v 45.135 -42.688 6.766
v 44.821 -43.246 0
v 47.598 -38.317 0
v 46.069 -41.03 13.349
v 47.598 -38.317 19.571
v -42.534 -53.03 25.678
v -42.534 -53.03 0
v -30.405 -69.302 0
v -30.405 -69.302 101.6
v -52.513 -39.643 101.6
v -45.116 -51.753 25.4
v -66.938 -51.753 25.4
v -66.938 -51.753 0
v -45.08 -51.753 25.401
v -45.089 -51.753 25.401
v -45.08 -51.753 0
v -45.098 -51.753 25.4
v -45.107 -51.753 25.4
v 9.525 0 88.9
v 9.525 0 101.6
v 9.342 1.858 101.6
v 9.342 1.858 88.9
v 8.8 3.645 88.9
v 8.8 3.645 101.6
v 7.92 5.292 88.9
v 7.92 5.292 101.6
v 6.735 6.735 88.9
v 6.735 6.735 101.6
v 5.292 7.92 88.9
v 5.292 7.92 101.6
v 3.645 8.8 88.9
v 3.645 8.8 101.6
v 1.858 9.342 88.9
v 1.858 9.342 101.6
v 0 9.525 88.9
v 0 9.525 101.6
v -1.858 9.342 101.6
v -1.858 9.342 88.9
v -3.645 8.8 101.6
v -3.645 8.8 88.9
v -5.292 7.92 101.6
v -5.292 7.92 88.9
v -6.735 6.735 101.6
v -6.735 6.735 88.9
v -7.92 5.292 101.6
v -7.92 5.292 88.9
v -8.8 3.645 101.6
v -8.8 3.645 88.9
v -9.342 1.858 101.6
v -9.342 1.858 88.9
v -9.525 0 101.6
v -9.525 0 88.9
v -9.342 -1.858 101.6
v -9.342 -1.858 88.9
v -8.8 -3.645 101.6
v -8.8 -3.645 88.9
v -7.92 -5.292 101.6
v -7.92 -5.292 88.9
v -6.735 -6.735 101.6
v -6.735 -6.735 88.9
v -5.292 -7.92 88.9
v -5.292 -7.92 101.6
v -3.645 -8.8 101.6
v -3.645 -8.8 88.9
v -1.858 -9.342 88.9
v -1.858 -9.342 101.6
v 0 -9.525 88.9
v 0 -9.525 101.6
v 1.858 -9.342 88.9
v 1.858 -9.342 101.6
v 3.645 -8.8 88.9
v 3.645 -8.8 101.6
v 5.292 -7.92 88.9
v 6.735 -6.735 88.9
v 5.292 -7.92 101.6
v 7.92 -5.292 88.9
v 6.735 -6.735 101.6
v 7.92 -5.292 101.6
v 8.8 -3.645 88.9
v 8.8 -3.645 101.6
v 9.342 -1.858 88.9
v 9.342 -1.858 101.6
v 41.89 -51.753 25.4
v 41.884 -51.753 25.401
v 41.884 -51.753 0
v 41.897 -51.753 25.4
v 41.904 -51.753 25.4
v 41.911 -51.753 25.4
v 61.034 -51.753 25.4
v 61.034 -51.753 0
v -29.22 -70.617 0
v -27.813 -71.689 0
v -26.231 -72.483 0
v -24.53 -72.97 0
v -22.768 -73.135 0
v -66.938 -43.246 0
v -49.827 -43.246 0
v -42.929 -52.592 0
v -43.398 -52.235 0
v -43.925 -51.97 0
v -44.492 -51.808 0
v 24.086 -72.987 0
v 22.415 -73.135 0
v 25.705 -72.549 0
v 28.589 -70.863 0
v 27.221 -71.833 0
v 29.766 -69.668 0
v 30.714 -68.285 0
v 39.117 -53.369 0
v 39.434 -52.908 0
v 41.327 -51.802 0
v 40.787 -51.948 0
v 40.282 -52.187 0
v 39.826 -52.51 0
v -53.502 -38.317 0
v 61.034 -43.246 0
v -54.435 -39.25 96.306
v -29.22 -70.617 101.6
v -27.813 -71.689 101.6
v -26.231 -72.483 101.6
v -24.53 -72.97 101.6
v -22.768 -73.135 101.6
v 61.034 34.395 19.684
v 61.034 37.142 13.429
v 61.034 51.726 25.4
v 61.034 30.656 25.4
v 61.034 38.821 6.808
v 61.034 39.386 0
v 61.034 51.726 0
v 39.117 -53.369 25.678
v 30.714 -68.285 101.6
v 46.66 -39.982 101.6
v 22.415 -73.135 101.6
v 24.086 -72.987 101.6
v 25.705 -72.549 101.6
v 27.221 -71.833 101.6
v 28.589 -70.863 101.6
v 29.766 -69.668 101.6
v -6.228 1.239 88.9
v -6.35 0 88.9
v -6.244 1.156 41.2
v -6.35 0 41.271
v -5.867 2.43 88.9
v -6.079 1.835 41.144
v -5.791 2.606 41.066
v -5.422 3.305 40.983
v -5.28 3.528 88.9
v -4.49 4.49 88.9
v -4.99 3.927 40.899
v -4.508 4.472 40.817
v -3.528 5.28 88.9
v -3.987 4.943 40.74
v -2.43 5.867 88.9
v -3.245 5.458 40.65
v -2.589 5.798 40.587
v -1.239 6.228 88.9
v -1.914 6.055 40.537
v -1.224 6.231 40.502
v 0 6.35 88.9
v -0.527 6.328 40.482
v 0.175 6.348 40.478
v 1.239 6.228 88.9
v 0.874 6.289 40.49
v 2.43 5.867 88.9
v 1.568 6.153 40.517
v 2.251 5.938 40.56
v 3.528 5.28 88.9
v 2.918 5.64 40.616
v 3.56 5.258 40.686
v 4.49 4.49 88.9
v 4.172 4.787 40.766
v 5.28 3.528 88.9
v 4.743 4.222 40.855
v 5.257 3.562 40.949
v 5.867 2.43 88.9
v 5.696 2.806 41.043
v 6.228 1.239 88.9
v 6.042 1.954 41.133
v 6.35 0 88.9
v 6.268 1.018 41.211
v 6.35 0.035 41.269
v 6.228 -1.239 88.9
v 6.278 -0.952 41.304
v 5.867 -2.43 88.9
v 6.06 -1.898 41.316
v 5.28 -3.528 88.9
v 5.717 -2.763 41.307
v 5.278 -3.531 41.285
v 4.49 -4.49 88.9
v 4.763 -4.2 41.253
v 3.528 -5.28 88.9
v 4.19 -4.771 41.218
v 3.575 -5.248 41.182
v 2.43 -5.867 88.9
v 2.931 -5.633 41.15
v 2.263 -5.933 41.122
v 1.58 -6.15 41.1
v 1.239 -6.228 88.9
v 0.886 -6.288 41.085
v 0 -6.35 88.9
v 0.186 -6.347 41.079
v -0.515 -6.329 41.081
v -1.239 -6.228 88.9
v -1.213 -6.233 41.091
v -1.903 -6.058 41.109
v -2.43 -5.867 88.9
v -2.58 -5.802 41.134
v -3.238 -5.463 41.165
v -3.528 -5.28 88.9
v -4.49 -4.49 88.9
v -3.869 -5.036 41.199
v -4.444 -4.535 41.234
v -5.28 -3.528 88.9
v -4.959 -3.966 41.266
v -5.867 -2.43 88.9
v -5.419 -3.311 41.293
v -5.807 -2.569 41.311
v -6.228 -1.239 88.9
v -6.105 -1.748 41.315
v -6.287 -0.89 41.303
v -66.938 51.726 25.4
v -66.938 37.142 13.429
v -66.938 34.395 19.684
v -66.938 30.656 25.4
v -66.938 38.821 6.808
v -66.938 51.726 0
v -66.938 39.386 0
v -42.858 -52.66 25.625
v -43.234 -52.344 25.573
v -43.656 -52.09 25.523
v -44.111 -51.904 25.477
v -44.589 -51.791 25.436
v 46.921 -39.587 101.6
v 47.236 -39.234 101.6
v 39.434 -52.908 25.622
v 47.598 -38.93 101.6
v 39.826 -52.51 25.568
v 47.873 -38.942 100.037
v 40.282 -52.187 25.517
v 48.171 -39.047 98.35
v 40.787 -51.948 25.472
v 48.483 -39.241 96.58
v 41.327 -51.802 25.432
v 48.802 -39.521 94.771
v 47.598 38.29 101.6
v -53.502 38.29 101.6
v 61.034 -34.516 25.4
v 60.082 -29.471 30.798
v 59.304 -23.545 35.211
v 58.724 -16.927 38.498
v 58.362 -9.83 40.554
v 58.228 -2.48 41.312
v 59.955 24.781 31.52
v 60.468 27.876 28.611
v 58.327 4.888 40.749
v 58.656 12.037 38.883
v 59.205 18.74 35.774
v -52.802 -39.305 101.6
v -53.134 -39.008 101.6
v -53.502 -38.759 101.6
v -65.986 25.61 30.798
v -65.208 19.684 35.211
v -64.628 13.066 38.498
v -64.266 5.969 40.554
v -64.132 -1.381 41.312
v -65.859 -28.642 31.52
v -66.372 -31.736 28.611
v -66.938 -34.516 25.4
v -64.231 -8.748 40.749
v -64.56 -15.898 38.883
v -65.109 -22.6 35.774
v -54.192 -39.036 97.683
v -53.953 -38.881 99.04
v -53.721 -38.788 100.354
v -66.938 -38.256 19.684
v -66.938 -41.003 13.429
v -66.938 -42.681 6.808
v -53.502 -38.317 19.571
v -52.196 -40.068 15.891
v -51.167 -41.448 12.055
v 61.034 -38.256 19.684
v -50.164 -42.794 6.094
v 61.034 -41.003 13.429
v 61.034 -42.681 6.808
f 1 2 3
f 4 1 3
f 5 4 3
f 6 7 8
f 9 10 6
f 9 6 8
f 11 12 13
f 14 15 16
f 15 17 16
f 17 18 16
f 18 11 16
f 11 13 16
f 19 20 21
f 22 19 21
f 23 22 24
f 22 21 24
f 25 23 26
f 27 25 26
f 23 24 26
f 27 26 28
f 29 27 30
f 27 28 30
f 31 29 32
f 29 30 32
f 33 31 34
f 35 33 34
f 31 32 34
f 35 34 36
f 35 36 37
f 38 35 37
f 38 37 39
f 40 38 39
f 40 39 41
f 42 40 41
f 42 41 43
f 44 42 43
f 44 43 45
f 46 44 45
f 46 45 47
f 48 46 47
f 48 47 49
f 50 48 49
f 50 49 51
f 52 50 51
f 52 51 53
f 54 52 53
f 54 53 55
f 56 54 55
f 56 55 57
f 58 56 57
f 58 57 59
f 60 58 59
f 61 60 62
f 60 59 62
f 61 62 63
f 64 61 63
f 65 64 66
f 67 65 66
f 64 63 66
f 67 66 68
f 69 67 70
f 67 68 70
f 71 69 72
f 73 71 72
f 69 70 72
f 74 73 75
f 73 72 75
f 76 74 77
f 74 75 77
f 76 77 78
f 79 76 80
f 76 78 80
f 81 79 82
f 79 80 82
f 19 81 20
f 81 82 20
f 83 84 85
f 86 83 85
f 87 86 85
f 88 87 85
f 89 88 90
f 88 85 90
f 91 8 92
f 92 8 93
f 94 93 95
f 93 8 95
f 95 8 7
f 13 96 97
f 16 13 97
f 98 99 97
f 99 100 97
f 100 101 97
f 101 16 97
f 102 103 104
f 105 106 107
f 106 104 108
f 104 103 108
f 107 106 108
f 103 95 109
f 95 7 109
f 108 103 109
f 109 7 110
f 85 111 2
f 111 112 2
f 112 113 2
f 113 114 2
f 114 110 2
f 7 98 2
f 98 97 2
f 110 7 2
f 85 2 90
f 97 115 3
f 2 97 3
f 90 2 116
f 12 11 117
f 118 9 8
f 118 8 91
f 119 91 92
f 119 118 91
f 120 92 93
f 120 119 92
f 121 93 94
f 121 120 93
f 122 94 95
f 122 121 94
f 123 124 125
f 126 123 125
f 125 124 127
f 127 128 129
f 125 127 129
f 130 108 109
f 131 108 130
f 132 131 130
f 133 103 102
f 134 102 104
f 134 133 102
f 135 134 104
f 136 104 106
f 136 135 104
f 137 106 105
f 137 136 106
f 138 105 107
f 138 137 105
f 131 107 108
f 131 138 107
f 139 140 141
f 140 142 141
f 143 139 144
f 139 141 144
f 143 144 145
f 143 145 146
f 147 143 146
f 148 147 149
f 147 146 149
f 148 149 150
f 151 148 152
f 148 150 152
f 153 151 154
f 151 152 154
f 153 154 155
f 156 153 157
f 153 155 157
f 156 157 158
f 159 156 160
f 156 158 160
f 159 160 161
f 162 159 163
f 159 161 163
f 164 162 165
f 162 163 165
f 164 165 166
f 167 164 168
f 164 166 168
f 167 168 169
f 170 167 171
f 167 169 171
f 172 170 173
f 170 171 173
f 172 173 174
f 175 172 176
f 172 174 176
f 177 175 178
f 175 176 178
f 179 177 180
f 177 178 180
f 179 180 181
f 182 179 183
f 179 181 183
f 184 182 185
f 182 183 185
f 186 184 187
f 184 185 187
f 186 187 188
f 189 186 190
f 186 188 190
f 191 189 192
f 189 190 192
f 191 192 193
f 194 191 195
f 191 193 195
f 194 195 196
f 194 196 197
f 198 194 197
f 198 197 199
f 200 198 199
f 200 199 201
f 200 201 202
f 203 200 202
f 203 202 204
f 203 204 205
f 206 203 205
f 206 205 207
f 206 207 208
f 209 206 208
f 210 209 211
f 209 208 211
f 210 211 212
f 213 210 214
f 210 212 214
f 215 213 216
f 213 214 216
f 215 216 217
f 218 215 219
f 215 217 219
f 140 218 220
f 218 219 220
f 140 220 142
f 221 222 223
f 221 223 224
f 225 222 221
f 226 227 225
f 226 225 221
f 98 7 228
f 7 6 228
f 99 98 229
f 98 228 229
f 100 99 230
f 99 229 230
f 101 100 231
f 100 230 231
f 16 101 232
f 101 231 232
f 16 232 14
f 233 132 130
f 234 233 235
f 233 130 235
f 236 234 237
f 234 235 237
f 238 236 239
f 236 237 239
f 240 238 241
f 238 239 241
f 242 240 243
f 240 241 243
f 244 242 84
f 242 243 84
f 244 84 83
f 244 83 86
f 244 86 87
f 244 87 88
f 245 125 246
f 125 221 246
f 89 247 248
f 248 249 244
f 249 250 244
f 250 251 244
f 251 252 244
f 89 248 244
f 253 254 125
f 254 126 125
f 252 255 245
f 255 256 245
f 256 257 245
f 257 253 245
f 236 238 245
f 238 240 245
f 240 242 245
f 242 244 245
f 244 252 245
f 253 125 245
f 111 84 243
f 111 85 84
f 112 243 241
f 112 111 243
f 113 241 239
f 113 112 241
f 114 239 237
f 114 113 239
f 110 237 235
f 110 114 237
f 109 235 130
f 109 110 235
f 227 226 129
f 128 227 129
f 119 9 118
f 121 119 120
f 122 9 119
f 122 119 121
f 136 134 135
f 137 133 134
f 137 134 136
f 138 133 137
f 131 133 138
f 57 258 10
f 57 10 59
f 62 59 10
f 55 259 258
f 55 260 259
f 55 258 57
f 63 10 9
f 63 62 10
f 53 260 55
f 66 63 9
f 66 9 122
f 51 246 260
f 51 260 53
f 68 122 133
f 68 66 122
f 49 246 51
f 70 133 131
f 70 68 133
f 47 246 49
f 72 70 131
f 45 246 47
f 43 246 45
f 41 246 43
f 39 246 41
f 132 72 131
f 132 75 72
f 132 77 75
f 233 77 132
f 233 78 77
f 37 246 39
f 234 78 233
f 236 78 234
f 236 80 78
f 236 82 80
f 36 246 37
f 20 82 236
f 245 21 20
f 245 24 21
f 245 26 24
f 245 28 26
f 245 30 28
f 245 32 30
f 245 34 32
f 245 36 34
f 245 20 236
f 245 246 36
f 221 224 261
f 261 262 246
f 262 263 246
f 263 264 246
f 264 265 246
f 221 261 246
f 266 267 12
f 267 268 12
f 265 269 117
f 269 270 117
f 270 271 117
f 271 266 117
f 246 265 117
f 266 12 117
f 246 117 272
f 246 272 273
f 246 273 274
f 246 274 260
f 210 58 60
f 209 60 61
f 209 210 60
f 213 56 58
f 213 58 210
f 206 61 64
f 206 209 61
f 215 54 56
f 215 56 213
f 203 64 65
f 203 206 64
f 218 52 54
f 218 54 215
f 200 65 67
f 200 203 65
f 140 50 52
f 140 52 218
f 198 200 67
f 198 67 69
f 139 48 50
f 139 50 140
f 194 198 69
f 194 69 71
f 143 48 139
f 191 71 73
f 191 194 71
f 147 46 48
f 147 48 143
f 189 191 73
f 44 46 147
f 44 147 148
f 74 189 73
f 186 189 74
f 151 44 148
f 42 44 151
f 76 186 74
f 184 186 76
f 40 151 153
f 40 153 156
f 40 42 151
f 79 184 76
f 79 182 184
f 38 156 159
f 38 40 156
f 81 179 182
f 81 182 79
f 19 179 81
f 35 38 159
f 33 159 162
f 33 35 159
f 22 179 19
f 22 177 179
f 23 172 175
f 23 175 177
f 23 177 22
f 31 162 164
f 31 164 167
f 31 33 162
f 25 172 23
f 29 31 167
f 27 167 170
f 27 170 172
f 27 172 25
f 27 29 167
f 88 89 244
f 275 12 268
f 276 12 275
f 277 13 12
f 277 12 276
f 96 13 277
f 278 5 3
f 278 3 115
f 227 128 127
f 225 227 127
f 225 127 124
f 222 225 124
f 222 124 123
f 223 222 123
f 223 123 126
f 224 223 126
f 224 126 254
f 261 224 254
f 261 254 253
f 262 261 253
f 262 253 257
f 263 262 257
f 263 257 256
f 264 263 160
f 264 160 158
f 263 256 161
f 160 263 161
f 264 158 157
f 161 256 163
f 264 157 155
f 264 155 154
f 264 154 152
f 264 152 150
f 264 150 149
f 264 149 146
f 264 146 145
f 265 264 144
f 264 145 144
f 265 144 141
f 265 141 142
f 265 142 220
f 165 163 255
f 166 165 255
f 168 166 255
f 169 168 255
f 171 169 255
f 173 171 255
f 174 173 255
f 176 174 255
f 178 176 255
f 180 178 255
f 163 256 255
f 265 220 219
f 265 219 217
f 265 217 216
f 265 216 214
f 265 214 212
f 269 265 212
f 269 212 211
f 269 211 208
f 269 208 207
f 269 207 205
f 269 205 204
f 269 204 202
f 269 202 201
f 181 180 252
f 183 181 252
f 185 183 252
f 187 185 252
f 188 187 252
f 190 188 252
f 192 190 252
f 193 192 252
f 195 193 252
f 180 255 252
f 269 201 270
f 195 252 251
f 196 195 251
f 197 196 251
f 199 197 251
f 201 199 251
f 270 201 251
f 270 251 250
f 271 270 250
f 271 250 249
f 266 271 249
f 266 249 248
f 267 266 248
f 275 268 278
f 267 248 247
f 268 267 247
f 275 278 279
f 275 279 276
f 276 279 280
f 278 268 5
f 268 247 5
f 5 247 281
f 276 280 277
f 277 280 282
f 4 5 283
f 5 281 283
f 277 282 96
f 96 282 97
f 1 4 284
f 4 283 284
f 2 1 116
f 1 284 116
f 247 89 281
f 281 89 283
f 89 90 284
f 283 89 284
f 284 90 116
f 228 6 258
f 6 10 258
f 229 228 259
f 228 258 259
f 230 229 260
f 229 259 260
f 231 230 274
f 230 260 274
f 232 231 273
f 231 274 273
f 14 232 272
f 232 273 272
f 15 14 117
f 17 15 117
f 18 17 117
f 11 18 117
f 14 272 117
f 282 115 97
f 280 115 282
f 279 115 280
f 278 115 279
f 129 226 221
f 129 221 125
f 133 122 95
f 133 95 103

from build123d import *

# Parameters (mm, degrees)
F0_W           = 127.9716864228
F0_H           = 103.479269892
F1_DEPTH       = 25.4
F1_FACE_W      = 127.9716864228
F1_FACE_H      = 103.479269892
F1_FACE1_W     = 127.9716864228
F1_FACE1_H     = 103.479269892
F2_DEPTH       = 76.2
F2_TAPER       = 10
F3_R           = 41.3158420999
F4_DEPTH       = 76.2
F6_D           = 12.7
F6_CBORE_D     = 19.05
F6_CBORE_DEPTH = 12.7
F8_DEPTH       = 101.6
F9_R           = 3.175
F10_R          = 3.175


with BuildPart() as f1:
    # F0 (on Top) → F1 (new body)
    with BuildSketch(Plane.XY):
        with Locations((-2.9518865049, -0.0131409615)):
            Rectangle(F0_W, F0_H)
    extrude(amount=F1_DEPTH)

    # F1_face (on face) + F1_face1 (on face) → F2 (join)
    with BuildSketch(Plane(origin=(-2.9518865049, -0.0131409615, 25.4), x_dir=(1, 0, 0), z_dir=(0, 0, 1))):
        Rectangle(F1_FACE_W, F1_FACE_H)
    with BuildSketch(Plane(origin=(-2.9518865049, -0.0131409615, 0), x_dir=(1, 0, 0), z_dir=(0, 0, -1))):
        Rectangle(F1_FACE1_W, F1_FACE1_H)
    extrude(amount=F2_DEPTH, taper=F2_TAPER, dir=(0, 0, 1))

    # F3 (on Right) → F4 (cut, symmetric)
    with BuildSketch(Plane.YZ):
        with Locations((-1.9303264562, 0)):
            Circle(F3_R)
    extrude(amount=F4_DEPTH, both=True, mode=Mode.SUBTRACT)

    # F6 (through all)
    with Locations(Plane.XY.offset(101.6)):
        with Locations((0, 0)):
            CounterBoreHole(F6_D / 2, F6_CBORE_D / 2, F6_CBORE_DEPTH)

    # F7 (on face) → F8 (join)
    with BuildSketch(Plane.XY.offset(101.6)):
        with BuildLine():
            Line((47.5978407765, -38.3166599775), (-53.5016137863, -38.3166599775))
            Line((-53.5016137863, -38.3166599775), (-30.4048839763, -69.3022799435))
            ThreePointArc((-30.4048839763, -69.3022799435), (-27.0403296326, -72.122907664), (-22.7680607757, -73.1347799301))
            Line((-22.7680607757, -73.1347799301), (22.4154582076, -73.1347799301))
            ThreePointArc((22.4154582076, -73.1347799301), (27.2213525546, -71.8334655106), (30.7140753293, -68.2850958411))
            Line((30.7140753293, -68.2850958411), (47.5978407765, -38.3166599775))
        make_face()
    extrude(amount=-F8_DEPTH)

    # F9
    f9_edges = [f1.edges().sort_by_distance(p)[0] for p in [
        (43.812988, -45.034718, 63.5),
        (40.028135, -51.752776, 12.7),
    ]]
    fillet(f9_edges, radius=F9_R)

    # F10
    f10_edges = [f1.edges().sort_by_distance(p)[0] for p in [
        (-48.493963, -45.034718, 63.5),
        (-43.486312, -51.752776, 12.7),
    ]]
    fillet(f10_edges, radius=F10_R)


solid = f1.part
